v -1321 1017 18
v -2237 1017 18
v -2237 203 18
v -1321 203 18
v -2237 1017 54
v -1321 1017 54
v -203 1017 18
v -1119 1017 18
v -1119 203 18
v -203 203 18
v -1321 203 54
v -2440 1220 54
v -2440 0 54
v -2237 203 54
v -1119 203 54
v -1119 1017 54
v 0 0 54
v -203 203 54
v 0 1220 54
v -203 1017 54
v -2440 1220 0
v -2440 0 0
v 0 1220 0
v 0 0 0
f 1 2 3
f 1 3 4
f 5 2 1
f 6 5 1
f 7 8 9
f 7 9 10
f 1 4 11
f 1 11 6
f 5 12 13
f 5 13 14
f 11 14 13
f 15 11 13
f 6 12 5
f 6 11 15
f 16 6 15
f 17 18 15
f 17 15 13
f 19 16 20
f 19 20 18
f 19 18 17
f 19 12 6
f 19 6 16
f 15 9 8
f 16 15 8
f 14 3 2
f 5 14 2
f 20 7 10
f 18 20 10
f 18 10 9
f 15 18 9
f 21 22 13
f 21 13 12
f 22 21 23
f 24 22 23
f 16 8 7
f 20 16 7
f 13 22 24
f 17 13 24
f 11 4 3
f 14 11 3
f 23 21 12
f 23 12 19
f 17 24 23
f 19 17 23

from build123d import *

# Parameters (mm, degrees)
F0_W     = 2440
F0_H     = 1220
F1_DEPTH = 54
F0_W_2   = 202
F0_H_2   = 814
F2_DEPTH = 54
F0_W_3   = 916
F3_DEPTH = 18


with BuildPart() as f1:
    # F0 (on Top) → F1 (new body)
    with BuildSketch(Plane.XY):
        with Locations((-1220, 610)):
            Rectangle(F0_W, F0_H)
        Polygon((-2237, 203), (-2237, 1017), (-1321, 1017), (-1119, 1017), (-203, 1017), (-203, 203), (-1119, 203), (-1321, 203), align=None, mode=Mode.SUBTRACT)
    extrude(amount=F1_DEPTH)

    # F0 (on Top) → F2 (join)
    with BuildSketch(Plane.XY):
        with Locations((-1220, 610)):
            Rectangle(F0_W_2, F0_H_2)
    extrude(amount=F2_DEPTH)

    # F0 (on Top) → F3 (join)
    with BuildSketch(Plane.XY):
        with Locations((-1779, 610)):
            Rectangle(F0_W_3, F0_H_2)
        with Locations((-661, 610)):
            Rectangle(F0_W_3, F0_H_2)
    extrude(amount=F3_DEPTH)


solid = f1.part
